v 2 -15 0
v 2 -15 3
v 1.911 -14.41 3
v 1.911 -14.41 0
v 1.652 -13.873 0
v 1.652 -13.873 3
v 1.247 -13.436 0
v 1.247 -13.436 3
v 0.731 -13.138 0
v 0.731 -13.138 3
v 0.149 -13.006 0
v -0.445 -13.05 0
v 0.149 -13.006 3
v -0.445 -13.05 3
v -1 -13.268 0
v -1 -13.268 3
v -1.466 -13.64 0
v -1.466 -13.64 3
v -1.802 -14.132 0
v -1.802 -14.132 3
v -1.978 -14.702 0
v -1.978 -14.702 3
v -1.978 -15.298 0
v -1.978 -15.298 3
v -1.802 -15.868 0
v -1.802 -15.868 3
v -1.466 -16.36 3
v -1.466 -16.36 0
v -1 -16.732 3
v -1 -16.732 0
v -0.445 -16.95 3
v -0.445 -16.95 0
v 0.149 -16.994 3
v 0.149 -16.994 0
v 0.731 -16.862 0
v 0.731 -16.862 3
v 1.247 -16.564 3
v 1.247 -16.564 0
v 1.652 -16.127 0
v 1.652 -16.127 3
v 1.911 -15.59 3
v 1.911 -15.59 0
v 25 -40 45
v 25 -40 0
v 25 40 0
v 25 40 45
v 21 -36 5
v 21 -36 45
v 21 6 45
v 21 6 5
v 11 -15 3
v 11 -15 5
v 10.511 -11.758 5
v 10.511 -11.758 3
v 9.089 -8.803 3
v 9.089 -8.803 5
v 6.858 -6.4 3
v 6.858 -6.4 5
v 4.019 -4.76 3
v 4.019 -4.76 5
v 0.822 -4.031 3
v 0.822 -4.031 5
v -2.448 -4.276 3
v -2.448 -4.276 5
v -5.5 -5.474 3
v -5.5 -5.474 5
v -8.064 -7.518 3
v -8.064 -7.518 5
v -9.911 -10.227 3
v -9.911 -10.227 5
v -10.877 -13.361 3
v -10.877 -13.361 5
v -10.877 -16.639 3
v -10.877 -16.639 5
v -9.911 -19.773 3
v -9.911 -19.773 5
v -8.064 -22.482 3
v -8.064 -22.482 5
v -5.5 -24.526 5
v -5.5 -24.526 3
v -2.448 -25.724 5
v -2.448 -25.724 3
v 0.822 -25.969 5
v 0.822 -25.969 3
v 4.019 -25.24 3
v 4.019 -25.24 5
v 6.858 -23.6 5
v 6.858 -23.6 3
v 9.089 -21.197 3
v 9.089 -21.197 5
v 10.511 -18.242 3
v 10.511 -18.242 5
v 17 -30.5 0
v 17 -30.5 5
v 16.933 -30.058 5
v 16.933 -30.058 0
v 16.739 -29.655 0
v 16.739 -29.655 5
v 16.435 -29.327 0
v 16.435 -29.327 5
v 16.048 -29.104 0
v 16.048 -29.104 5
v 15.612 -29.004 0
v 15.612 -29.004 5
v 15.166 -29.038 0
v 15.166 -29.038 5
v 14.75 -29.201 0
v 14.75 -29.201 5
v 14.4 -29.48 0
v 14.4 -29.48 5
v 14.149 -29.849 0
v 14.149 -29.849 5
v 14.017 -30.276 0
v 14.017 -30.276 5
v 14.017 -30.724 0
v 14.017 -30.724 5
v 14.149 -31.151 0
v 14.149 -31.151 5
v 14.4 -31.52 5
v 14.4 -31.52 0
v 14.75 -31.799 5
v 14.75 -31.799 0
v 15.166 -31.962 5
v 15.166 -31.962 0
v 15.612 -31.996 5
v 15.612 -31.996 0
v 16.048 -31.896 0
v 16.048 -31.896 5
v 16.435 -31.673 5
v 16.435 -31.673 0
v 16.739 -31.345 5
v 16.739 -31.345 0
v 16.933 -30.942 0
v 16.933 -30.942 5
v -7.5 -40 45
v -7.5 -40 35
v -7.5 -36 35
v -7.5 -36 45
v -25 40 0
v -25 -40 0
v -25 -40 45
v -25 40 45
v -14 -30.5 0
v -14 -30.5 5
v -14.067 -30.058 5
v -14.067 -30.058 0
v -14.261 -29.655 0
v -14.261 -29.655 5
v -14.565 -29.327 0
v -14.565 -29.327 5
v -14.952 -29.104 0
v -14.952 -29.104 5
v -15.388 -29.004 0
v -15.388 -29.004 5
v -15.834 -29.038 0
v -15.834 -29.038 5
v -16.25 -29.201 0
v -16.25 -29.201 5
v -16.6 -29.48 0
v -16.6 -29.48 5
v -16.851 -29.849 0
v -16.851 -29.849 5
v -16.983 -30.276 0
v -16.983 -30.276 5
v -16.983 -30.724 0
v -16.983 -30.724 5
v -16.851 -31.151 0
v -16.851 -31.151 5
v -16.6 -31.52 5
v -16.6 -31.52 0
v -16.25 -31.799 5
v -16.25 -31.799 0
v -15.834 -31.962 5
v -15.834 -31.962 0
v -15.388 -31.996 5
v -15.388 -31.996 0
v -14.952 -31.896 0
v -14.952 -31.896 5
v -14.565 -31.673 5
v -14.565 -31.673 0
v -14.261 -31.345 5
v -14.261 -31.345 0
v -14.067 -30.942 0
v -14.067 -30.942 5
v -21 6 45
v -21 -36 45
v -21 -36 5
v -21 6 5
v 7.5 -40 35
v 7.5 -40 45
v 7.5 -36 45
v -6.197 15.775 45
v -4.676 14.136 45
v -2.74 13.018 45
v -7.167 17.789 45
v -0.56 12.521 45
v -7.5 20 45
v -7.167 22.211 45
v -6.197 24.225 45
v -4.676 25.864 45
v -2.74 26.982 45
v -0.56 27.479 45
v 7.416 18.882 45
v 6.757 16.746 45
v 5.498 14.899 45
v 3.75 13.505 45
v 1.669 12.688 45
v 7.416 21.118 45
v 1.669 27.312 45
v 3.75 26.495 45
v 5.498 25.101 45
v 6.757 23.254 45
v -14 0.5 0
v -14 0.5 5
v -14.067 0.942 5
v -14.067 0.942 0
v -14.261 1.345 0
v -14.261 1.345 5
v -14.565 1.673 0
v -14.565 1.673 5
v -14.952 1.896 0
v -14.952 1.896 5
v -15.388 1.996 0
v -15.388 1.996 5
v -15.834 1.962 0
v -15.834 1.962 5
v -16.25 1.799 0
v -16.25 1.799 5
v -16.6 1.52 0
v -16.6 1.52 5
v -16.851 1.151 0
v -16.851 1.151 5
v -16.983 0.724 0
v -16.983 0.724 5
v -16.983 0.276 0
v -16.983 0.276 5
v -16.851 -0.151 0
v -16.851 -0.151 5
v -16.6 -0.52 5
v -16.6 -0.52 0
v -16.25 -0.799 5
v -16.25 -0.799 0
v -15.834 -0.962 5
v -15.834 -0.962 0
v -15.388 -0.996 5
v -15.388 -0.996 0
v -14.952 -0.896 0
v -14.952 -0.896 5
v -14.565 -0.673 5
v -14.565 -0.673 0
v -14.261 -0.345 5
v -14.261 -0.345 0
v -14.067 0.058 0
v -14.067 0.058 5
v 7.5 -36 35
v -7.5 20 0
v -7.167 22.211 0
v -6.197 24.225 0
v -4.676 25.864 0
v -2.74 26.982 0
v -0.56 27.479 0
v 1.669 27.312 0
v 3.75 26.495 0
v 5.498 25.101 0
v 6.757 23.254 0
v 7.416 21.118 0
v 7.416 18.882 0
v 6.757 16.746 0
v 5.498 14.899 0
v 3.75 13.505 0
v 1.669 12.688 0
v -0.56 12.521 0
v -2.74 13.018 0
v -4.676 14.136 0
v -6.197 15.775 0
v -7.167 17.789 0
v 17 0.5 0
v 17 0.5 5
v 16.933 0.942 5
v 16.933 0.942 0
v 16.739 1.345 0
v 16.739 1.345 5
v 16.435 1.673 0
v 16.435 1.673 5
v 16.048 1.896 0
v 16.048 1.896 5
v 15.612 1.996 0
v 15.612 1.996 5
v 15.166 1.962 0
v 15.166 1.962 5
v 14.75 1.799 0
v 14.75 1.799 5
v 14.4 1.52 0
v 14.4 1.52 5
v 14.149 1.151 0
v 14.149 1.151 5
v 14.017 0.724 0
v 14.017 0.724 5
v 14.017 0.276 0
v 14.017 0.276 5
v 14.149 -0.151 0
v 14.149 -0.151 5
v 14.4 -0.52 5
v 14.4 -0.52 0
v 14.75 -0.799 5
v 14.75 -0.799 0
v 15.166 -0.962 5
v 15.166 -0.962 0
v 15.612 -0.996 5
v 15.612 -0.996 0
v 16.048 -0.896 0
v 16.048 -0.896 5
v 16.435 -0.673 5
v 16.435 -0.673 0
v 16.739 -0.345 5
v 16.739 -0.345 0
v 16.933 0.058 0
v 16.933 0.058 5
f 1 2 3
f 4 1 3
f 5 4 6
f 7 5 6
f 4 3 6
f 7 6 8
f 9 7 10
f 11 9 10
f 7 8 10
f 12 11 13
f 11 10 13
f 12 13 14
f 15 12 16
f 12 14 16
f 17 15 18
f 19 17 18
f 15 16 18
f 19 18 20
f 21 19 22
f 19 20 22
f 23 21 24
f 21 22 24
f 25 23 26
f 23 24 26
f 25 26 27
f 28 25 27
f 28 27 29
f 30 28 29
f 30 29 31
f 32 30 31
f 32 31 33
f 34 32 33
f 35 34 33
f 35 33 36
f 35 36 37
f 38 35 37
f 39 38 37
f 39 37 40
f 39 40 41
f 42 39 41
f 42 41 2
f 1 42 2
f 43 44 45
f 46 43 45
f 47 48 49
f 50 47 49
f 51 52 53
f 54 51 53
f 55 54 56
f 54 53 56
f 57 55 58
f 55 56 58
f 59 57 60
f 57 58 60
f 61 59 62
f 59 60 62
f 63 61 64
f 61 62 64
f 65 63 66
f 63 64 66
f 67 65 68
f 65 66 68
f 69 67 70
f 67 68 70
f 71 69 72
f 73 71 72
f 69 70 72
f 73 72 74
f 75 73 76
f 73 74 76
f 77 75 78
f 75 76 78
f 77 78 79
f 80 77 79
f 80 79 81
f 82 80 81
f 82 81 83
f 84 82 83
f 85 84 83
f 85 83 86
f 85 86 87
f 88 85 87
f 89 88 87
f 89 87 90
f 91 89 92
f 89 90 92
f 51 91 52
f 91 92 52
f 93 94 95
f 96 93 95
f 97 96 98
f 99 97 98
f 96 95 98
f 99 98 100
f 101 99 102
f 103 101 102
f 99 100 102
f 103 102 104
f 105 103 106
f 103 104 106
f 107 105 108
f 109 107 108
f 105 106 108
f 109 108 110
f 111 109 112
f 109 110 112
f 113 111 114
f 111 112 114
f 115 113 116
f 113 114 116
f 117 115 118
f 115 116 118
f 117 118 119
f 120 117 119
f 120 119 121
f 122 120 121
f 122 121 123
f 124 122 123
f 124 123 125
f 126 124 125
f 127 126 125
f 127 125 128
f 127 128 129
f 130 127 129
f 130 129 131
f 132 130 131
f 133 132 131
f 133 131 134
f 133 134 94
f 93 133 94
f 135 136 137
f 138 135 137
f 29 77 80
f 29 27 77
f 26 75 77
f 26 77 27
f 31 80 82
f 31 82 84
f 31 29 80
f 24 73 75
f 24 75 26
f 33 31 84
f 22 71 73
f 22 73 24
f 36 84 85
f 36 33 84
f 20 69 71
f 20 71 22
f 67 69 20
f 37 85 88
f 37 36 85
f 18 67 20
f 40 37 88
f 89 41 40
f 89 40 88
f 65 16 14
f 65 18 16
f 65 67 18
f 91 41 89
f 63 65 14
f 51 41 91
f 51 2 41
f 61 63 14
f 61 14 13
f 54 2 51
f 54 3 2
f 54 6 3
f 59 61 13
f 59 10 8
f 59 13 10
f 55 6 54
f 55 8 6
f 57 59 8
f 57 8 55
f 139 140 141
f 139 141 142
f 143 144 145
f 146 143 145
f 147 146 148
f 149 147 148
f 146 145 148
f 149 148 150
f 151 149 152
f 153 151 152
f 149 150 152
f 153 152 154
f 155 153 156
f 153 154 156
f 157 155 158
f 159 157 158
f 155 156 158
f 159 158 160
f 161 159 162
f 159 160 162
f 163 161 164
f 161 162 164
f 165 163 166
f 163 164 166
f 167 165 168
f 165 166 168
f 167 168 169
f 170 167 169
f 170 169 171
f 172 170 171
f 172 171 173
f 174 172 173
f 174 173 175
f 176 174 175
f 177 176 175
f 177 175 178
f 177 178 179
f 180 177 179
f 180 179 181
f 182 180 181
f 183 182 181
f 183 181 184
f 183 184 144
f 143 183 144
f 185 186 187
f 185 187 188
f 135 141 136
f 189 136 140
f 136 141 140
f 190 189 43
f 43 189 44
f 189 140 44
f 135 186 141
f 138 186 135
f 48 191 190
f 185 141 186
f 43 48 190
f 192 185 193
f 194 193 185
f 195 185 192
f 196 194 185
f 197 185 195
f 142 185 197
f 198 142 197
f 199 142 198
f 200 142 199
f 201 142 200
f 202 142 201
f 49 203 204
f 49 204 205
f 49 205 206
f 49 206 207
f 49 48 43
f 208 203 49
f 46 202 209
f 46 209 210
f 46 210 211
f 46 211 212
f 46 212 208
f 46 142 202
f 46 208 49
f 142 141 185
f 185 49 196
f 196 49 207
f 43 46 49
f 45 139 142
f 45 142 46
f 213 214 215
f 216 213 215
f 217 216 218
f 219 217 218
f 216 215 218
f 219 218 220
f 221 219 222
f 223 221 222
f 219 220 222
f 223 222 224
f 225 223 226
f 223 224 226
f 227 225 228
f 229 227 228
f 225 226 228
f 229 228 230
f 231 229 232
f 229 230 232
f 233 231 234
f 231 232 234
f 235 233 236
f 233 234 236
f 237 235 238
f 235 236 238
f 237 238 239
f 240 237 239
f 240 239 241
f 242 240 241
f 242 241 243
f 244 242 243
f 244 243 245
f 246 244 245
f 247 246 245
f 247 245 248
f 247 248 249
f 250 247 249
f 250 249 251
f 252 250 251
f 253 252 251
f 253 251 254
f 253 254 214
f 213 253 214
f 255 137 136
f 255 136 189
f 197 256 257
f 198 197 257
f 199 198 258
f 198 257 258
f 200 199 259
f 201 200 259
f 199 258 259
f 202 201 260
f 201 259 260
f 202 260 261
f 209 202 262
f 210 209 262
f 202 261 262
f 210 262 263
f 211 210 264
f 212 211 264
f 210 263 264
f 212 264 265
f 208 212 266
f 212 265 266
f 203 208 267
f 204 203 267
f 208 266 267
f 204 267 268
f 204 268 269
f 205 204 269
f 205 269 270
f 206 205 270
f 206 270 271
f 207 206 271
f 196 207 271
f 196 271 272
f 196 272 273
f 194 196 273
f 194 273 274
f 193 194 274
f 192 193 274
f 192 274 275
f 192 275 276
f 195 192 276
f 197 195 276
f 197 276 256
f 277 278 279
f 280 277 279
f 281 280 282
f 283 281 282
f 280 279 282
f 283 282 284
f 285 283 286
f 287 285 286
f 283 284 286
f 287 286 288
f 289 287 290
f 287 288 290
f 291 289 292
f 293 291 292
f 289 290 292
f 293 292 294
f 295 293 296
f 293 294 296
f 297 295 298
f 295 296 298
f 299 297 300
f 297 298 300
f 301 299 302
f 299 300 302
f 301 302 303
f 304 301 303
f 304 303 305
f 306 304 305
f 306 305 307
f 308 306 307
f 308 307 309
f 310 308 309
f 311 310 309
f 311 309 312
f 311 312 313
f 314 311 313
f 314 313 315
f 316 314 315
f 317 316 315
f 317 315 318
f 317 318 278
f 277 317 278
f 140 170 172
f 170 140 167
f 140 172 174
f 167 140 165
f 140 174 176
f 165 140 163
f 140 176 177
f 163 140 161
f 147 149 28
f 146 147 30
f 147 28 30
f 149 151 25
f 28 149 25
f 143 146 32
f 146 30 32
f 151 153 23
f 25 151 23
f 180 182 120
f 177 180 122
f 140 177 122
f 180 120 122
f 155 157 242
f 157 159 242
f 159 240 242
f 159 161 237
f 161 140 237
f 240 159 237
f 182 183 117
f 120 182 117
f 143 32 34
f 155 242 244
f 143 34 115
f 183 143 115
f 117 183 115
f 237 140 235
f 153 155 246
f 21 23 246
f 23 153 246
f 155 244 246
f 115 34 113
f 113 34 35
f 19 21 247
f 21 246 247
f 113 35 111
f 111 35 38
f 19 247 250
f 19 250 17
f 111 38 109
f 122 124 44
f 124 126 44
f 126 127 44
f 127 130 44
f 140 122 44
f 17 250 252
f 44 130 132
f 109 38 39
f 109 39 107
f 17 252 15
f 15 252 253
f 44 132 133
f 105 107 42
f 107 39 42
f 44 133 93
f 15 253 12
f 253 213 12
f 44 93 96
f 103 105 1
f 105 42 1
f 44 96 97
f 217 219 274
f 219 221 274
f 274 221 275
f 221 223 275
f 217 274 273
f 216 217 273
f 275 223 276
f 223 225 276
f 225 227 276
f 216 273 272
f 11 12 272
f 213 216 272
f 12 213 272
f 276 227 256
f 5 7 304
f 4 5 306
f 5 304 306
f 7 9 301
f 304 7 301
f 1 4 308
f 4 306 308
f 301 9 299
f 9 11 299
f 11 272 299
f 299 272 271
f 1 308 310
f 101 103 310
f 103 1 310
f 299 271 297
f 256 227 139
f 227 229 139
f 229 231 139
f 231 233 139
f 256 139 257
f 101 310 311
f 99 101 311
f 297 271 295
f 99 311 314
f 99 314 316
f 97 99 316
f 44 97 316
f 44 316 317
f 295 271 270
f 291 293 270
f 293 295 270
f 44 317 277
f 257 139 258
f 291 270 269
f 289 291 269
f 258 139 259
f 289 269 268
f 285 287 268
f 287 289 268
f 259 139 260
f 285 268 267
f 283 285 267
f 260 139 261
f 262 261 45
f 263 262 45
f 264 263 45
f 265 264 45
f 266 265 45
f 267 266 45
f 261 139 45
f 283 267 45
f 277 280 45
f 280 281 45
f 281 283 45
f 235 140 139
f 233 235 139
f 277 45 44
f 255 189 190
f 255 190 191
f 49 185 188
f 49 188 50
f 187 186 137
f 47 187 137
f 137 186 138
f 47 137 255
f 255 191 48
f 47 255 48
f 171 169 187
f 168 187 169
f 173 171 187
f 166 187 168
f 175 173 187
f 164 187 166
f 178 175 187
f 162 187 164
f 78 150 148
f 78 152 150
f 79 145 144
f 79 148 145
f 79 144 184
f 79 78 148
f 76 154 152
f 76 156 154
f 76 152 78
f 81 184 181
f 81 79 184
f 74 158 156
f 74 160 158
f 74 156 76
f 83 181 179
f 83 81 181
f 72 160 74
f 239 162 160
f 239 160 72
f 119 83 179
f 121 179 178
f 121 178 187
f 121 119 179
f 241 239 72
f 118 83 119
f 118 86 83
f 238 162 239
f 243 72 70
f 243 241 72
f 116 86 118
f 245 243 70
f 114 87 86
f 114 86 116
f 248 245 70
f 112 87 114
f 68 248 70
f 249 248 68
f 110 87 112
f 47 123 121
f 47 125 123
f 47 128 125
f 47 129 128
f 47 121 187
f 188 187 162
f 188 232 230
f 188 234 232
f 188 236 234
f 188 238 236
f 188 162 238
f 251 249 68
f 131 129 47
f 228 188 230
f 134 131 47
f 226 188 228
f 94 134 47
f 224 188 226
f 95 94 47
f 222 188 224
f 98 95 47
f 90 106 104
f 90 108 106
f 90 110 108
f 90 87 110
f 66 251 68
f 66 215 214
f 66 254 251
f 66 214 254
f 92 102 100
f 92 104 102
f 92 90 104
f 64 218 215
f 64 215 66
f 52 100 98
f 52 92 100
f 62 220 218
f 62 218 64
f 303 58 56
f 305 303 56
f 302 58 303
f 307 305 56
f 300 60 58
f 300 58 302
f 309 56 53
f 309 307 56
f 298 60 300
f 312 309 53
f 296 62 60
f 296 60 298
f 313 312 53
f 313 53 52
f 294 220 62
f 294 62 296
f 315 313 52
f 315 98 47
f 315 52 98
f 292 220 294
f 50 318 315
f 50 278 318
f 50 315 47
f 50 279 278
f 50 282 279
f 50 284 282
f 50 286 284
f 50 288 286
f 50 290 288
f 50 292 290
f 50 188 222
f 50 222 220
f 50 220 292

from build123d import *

# Parameters (mm, degrees)
SKETCH1_W           = 50
SKETCH1_H           = 80
BOSS_EXTRUDE1_DEPTH = 45
SKETCH5_W           = 42
SKETCH5_H           = 42
CUT_EXTRUDE1_DEPTH  = 40
SKETCH6_R           = 1.5
CUT_EXTRUDE2_DEPTH  = 40
SKETCH7_W           = 15
SKETCH7_H           = 41.689626702
CUT_EXTRUDE3_DEPTH  = 10
SKETCH8_R           = 11
CUT_EXTRUDE4_DEPTH  = 2
SKETCH9_R           = 2
CUT_EXTRUDE5_DEPTH  = 10
SKETCH2_R           = 2.5
CUT_EXTRUDE6_DEPTH  = 10
SKETCH10_R          = 7.5
CUT_EXTRUDE7_DEPTH  = 48


with BuildPart() as part:
    # Sketch1 → Boss-Extrude1 (new body)
    with BuildSketch(Plane.XY):
        Rectangle(SKETCH1_W, SKETCH1_H)
    extrude(amount=BOSS_EXTRUDE1_DEPTH)

    # Sketch5 → Cut-Extrude1 (cut)
    with BuildSketch(Plane.XY.offset(45)):
        with Locations((0, -15)):
            Rectangle(SKETCH5_W, SKETCH5_H)
    extrude(amount=-CUT_EXTRUDE1_DEPTH, mode=Mode.SUBTRACT)

    # Sketch6 → Cut-Extrude2 (cut)
    with BuildSketch(Plane.XY.offset(5)):
        with Locations((15.5, -30.5)):
            Circle(SKETCH6_R)
        with Locations((15.5, 0.5)):
            Circle(SKETCH6_R)
        with Locations((-15.5, -30.5)):
            Circle(SKETCH6_R)
        with Locations((-15.5, 0.5)):
            Circle(SKETCH6_R)
    extrude(amount=-CUT_EXTRUDE2_DEPTH, mode=Mode.SUBTRACT)

    # Sketch7 → Cut-Extrude3 (cut)
    with BuildSketch(Plane.XY.offset(45)):
        with Locations((0, -40)):
            Rectangle(SKETCH7_W, SKETCH7_H)
    extrude(amount=-CUT_EXTRUDE3_DEPTH, mode=Mode.SUBTRACT)

    # Sketch8 → Cut-Extrude4 (cut)
    with BuildSketch(Plane.XY.offset(5)):
        with Locations((0, -15)):
            Circle(SKETCH8_R)
    extrude(amount=-CUT_EXTRUDE4_DEPTH, mode=Mode.SUBTRACT)

    # Sketch9 → Cut-Extrude5 (cut)
    with BuildSketch(Plane.XY.offset(3)):
        with Locations((0, -15)):
            Circle(SKETCH9_R)
    extrude(amount=-CUT_EXTRUDE5_DEPTH, mode=Mode.SUBTRACT)

    # Sketch2 → Cut-Extrude6 (cut)
    with BuildSketch(Plane(origin=(0, 0, 0), x_dir=(-1, 0, 0), z_dir=(0, 0, -1))):
        with Locations((0, 20)):
            Circle(SKETCH2_R)
    extrude(amount=-CUT_EXTRUDE6_DEPTH, mode=Mode.SUBTRACT)

    # Sketch10 → Cut-Extrude7 (cut)
    with BuildSketch(Plane(origin=(0, 0, 0), x_dir=(-1, 0, 0), z_dir=(0, 0, -1))):
        with Locations((0, 20)):
            Circle(SKETCH10_R)
    extrude(amount=-CUT_EXTRUDE7_DEPTH, mode=Mode.SUBTRACT)


solid = part.part
